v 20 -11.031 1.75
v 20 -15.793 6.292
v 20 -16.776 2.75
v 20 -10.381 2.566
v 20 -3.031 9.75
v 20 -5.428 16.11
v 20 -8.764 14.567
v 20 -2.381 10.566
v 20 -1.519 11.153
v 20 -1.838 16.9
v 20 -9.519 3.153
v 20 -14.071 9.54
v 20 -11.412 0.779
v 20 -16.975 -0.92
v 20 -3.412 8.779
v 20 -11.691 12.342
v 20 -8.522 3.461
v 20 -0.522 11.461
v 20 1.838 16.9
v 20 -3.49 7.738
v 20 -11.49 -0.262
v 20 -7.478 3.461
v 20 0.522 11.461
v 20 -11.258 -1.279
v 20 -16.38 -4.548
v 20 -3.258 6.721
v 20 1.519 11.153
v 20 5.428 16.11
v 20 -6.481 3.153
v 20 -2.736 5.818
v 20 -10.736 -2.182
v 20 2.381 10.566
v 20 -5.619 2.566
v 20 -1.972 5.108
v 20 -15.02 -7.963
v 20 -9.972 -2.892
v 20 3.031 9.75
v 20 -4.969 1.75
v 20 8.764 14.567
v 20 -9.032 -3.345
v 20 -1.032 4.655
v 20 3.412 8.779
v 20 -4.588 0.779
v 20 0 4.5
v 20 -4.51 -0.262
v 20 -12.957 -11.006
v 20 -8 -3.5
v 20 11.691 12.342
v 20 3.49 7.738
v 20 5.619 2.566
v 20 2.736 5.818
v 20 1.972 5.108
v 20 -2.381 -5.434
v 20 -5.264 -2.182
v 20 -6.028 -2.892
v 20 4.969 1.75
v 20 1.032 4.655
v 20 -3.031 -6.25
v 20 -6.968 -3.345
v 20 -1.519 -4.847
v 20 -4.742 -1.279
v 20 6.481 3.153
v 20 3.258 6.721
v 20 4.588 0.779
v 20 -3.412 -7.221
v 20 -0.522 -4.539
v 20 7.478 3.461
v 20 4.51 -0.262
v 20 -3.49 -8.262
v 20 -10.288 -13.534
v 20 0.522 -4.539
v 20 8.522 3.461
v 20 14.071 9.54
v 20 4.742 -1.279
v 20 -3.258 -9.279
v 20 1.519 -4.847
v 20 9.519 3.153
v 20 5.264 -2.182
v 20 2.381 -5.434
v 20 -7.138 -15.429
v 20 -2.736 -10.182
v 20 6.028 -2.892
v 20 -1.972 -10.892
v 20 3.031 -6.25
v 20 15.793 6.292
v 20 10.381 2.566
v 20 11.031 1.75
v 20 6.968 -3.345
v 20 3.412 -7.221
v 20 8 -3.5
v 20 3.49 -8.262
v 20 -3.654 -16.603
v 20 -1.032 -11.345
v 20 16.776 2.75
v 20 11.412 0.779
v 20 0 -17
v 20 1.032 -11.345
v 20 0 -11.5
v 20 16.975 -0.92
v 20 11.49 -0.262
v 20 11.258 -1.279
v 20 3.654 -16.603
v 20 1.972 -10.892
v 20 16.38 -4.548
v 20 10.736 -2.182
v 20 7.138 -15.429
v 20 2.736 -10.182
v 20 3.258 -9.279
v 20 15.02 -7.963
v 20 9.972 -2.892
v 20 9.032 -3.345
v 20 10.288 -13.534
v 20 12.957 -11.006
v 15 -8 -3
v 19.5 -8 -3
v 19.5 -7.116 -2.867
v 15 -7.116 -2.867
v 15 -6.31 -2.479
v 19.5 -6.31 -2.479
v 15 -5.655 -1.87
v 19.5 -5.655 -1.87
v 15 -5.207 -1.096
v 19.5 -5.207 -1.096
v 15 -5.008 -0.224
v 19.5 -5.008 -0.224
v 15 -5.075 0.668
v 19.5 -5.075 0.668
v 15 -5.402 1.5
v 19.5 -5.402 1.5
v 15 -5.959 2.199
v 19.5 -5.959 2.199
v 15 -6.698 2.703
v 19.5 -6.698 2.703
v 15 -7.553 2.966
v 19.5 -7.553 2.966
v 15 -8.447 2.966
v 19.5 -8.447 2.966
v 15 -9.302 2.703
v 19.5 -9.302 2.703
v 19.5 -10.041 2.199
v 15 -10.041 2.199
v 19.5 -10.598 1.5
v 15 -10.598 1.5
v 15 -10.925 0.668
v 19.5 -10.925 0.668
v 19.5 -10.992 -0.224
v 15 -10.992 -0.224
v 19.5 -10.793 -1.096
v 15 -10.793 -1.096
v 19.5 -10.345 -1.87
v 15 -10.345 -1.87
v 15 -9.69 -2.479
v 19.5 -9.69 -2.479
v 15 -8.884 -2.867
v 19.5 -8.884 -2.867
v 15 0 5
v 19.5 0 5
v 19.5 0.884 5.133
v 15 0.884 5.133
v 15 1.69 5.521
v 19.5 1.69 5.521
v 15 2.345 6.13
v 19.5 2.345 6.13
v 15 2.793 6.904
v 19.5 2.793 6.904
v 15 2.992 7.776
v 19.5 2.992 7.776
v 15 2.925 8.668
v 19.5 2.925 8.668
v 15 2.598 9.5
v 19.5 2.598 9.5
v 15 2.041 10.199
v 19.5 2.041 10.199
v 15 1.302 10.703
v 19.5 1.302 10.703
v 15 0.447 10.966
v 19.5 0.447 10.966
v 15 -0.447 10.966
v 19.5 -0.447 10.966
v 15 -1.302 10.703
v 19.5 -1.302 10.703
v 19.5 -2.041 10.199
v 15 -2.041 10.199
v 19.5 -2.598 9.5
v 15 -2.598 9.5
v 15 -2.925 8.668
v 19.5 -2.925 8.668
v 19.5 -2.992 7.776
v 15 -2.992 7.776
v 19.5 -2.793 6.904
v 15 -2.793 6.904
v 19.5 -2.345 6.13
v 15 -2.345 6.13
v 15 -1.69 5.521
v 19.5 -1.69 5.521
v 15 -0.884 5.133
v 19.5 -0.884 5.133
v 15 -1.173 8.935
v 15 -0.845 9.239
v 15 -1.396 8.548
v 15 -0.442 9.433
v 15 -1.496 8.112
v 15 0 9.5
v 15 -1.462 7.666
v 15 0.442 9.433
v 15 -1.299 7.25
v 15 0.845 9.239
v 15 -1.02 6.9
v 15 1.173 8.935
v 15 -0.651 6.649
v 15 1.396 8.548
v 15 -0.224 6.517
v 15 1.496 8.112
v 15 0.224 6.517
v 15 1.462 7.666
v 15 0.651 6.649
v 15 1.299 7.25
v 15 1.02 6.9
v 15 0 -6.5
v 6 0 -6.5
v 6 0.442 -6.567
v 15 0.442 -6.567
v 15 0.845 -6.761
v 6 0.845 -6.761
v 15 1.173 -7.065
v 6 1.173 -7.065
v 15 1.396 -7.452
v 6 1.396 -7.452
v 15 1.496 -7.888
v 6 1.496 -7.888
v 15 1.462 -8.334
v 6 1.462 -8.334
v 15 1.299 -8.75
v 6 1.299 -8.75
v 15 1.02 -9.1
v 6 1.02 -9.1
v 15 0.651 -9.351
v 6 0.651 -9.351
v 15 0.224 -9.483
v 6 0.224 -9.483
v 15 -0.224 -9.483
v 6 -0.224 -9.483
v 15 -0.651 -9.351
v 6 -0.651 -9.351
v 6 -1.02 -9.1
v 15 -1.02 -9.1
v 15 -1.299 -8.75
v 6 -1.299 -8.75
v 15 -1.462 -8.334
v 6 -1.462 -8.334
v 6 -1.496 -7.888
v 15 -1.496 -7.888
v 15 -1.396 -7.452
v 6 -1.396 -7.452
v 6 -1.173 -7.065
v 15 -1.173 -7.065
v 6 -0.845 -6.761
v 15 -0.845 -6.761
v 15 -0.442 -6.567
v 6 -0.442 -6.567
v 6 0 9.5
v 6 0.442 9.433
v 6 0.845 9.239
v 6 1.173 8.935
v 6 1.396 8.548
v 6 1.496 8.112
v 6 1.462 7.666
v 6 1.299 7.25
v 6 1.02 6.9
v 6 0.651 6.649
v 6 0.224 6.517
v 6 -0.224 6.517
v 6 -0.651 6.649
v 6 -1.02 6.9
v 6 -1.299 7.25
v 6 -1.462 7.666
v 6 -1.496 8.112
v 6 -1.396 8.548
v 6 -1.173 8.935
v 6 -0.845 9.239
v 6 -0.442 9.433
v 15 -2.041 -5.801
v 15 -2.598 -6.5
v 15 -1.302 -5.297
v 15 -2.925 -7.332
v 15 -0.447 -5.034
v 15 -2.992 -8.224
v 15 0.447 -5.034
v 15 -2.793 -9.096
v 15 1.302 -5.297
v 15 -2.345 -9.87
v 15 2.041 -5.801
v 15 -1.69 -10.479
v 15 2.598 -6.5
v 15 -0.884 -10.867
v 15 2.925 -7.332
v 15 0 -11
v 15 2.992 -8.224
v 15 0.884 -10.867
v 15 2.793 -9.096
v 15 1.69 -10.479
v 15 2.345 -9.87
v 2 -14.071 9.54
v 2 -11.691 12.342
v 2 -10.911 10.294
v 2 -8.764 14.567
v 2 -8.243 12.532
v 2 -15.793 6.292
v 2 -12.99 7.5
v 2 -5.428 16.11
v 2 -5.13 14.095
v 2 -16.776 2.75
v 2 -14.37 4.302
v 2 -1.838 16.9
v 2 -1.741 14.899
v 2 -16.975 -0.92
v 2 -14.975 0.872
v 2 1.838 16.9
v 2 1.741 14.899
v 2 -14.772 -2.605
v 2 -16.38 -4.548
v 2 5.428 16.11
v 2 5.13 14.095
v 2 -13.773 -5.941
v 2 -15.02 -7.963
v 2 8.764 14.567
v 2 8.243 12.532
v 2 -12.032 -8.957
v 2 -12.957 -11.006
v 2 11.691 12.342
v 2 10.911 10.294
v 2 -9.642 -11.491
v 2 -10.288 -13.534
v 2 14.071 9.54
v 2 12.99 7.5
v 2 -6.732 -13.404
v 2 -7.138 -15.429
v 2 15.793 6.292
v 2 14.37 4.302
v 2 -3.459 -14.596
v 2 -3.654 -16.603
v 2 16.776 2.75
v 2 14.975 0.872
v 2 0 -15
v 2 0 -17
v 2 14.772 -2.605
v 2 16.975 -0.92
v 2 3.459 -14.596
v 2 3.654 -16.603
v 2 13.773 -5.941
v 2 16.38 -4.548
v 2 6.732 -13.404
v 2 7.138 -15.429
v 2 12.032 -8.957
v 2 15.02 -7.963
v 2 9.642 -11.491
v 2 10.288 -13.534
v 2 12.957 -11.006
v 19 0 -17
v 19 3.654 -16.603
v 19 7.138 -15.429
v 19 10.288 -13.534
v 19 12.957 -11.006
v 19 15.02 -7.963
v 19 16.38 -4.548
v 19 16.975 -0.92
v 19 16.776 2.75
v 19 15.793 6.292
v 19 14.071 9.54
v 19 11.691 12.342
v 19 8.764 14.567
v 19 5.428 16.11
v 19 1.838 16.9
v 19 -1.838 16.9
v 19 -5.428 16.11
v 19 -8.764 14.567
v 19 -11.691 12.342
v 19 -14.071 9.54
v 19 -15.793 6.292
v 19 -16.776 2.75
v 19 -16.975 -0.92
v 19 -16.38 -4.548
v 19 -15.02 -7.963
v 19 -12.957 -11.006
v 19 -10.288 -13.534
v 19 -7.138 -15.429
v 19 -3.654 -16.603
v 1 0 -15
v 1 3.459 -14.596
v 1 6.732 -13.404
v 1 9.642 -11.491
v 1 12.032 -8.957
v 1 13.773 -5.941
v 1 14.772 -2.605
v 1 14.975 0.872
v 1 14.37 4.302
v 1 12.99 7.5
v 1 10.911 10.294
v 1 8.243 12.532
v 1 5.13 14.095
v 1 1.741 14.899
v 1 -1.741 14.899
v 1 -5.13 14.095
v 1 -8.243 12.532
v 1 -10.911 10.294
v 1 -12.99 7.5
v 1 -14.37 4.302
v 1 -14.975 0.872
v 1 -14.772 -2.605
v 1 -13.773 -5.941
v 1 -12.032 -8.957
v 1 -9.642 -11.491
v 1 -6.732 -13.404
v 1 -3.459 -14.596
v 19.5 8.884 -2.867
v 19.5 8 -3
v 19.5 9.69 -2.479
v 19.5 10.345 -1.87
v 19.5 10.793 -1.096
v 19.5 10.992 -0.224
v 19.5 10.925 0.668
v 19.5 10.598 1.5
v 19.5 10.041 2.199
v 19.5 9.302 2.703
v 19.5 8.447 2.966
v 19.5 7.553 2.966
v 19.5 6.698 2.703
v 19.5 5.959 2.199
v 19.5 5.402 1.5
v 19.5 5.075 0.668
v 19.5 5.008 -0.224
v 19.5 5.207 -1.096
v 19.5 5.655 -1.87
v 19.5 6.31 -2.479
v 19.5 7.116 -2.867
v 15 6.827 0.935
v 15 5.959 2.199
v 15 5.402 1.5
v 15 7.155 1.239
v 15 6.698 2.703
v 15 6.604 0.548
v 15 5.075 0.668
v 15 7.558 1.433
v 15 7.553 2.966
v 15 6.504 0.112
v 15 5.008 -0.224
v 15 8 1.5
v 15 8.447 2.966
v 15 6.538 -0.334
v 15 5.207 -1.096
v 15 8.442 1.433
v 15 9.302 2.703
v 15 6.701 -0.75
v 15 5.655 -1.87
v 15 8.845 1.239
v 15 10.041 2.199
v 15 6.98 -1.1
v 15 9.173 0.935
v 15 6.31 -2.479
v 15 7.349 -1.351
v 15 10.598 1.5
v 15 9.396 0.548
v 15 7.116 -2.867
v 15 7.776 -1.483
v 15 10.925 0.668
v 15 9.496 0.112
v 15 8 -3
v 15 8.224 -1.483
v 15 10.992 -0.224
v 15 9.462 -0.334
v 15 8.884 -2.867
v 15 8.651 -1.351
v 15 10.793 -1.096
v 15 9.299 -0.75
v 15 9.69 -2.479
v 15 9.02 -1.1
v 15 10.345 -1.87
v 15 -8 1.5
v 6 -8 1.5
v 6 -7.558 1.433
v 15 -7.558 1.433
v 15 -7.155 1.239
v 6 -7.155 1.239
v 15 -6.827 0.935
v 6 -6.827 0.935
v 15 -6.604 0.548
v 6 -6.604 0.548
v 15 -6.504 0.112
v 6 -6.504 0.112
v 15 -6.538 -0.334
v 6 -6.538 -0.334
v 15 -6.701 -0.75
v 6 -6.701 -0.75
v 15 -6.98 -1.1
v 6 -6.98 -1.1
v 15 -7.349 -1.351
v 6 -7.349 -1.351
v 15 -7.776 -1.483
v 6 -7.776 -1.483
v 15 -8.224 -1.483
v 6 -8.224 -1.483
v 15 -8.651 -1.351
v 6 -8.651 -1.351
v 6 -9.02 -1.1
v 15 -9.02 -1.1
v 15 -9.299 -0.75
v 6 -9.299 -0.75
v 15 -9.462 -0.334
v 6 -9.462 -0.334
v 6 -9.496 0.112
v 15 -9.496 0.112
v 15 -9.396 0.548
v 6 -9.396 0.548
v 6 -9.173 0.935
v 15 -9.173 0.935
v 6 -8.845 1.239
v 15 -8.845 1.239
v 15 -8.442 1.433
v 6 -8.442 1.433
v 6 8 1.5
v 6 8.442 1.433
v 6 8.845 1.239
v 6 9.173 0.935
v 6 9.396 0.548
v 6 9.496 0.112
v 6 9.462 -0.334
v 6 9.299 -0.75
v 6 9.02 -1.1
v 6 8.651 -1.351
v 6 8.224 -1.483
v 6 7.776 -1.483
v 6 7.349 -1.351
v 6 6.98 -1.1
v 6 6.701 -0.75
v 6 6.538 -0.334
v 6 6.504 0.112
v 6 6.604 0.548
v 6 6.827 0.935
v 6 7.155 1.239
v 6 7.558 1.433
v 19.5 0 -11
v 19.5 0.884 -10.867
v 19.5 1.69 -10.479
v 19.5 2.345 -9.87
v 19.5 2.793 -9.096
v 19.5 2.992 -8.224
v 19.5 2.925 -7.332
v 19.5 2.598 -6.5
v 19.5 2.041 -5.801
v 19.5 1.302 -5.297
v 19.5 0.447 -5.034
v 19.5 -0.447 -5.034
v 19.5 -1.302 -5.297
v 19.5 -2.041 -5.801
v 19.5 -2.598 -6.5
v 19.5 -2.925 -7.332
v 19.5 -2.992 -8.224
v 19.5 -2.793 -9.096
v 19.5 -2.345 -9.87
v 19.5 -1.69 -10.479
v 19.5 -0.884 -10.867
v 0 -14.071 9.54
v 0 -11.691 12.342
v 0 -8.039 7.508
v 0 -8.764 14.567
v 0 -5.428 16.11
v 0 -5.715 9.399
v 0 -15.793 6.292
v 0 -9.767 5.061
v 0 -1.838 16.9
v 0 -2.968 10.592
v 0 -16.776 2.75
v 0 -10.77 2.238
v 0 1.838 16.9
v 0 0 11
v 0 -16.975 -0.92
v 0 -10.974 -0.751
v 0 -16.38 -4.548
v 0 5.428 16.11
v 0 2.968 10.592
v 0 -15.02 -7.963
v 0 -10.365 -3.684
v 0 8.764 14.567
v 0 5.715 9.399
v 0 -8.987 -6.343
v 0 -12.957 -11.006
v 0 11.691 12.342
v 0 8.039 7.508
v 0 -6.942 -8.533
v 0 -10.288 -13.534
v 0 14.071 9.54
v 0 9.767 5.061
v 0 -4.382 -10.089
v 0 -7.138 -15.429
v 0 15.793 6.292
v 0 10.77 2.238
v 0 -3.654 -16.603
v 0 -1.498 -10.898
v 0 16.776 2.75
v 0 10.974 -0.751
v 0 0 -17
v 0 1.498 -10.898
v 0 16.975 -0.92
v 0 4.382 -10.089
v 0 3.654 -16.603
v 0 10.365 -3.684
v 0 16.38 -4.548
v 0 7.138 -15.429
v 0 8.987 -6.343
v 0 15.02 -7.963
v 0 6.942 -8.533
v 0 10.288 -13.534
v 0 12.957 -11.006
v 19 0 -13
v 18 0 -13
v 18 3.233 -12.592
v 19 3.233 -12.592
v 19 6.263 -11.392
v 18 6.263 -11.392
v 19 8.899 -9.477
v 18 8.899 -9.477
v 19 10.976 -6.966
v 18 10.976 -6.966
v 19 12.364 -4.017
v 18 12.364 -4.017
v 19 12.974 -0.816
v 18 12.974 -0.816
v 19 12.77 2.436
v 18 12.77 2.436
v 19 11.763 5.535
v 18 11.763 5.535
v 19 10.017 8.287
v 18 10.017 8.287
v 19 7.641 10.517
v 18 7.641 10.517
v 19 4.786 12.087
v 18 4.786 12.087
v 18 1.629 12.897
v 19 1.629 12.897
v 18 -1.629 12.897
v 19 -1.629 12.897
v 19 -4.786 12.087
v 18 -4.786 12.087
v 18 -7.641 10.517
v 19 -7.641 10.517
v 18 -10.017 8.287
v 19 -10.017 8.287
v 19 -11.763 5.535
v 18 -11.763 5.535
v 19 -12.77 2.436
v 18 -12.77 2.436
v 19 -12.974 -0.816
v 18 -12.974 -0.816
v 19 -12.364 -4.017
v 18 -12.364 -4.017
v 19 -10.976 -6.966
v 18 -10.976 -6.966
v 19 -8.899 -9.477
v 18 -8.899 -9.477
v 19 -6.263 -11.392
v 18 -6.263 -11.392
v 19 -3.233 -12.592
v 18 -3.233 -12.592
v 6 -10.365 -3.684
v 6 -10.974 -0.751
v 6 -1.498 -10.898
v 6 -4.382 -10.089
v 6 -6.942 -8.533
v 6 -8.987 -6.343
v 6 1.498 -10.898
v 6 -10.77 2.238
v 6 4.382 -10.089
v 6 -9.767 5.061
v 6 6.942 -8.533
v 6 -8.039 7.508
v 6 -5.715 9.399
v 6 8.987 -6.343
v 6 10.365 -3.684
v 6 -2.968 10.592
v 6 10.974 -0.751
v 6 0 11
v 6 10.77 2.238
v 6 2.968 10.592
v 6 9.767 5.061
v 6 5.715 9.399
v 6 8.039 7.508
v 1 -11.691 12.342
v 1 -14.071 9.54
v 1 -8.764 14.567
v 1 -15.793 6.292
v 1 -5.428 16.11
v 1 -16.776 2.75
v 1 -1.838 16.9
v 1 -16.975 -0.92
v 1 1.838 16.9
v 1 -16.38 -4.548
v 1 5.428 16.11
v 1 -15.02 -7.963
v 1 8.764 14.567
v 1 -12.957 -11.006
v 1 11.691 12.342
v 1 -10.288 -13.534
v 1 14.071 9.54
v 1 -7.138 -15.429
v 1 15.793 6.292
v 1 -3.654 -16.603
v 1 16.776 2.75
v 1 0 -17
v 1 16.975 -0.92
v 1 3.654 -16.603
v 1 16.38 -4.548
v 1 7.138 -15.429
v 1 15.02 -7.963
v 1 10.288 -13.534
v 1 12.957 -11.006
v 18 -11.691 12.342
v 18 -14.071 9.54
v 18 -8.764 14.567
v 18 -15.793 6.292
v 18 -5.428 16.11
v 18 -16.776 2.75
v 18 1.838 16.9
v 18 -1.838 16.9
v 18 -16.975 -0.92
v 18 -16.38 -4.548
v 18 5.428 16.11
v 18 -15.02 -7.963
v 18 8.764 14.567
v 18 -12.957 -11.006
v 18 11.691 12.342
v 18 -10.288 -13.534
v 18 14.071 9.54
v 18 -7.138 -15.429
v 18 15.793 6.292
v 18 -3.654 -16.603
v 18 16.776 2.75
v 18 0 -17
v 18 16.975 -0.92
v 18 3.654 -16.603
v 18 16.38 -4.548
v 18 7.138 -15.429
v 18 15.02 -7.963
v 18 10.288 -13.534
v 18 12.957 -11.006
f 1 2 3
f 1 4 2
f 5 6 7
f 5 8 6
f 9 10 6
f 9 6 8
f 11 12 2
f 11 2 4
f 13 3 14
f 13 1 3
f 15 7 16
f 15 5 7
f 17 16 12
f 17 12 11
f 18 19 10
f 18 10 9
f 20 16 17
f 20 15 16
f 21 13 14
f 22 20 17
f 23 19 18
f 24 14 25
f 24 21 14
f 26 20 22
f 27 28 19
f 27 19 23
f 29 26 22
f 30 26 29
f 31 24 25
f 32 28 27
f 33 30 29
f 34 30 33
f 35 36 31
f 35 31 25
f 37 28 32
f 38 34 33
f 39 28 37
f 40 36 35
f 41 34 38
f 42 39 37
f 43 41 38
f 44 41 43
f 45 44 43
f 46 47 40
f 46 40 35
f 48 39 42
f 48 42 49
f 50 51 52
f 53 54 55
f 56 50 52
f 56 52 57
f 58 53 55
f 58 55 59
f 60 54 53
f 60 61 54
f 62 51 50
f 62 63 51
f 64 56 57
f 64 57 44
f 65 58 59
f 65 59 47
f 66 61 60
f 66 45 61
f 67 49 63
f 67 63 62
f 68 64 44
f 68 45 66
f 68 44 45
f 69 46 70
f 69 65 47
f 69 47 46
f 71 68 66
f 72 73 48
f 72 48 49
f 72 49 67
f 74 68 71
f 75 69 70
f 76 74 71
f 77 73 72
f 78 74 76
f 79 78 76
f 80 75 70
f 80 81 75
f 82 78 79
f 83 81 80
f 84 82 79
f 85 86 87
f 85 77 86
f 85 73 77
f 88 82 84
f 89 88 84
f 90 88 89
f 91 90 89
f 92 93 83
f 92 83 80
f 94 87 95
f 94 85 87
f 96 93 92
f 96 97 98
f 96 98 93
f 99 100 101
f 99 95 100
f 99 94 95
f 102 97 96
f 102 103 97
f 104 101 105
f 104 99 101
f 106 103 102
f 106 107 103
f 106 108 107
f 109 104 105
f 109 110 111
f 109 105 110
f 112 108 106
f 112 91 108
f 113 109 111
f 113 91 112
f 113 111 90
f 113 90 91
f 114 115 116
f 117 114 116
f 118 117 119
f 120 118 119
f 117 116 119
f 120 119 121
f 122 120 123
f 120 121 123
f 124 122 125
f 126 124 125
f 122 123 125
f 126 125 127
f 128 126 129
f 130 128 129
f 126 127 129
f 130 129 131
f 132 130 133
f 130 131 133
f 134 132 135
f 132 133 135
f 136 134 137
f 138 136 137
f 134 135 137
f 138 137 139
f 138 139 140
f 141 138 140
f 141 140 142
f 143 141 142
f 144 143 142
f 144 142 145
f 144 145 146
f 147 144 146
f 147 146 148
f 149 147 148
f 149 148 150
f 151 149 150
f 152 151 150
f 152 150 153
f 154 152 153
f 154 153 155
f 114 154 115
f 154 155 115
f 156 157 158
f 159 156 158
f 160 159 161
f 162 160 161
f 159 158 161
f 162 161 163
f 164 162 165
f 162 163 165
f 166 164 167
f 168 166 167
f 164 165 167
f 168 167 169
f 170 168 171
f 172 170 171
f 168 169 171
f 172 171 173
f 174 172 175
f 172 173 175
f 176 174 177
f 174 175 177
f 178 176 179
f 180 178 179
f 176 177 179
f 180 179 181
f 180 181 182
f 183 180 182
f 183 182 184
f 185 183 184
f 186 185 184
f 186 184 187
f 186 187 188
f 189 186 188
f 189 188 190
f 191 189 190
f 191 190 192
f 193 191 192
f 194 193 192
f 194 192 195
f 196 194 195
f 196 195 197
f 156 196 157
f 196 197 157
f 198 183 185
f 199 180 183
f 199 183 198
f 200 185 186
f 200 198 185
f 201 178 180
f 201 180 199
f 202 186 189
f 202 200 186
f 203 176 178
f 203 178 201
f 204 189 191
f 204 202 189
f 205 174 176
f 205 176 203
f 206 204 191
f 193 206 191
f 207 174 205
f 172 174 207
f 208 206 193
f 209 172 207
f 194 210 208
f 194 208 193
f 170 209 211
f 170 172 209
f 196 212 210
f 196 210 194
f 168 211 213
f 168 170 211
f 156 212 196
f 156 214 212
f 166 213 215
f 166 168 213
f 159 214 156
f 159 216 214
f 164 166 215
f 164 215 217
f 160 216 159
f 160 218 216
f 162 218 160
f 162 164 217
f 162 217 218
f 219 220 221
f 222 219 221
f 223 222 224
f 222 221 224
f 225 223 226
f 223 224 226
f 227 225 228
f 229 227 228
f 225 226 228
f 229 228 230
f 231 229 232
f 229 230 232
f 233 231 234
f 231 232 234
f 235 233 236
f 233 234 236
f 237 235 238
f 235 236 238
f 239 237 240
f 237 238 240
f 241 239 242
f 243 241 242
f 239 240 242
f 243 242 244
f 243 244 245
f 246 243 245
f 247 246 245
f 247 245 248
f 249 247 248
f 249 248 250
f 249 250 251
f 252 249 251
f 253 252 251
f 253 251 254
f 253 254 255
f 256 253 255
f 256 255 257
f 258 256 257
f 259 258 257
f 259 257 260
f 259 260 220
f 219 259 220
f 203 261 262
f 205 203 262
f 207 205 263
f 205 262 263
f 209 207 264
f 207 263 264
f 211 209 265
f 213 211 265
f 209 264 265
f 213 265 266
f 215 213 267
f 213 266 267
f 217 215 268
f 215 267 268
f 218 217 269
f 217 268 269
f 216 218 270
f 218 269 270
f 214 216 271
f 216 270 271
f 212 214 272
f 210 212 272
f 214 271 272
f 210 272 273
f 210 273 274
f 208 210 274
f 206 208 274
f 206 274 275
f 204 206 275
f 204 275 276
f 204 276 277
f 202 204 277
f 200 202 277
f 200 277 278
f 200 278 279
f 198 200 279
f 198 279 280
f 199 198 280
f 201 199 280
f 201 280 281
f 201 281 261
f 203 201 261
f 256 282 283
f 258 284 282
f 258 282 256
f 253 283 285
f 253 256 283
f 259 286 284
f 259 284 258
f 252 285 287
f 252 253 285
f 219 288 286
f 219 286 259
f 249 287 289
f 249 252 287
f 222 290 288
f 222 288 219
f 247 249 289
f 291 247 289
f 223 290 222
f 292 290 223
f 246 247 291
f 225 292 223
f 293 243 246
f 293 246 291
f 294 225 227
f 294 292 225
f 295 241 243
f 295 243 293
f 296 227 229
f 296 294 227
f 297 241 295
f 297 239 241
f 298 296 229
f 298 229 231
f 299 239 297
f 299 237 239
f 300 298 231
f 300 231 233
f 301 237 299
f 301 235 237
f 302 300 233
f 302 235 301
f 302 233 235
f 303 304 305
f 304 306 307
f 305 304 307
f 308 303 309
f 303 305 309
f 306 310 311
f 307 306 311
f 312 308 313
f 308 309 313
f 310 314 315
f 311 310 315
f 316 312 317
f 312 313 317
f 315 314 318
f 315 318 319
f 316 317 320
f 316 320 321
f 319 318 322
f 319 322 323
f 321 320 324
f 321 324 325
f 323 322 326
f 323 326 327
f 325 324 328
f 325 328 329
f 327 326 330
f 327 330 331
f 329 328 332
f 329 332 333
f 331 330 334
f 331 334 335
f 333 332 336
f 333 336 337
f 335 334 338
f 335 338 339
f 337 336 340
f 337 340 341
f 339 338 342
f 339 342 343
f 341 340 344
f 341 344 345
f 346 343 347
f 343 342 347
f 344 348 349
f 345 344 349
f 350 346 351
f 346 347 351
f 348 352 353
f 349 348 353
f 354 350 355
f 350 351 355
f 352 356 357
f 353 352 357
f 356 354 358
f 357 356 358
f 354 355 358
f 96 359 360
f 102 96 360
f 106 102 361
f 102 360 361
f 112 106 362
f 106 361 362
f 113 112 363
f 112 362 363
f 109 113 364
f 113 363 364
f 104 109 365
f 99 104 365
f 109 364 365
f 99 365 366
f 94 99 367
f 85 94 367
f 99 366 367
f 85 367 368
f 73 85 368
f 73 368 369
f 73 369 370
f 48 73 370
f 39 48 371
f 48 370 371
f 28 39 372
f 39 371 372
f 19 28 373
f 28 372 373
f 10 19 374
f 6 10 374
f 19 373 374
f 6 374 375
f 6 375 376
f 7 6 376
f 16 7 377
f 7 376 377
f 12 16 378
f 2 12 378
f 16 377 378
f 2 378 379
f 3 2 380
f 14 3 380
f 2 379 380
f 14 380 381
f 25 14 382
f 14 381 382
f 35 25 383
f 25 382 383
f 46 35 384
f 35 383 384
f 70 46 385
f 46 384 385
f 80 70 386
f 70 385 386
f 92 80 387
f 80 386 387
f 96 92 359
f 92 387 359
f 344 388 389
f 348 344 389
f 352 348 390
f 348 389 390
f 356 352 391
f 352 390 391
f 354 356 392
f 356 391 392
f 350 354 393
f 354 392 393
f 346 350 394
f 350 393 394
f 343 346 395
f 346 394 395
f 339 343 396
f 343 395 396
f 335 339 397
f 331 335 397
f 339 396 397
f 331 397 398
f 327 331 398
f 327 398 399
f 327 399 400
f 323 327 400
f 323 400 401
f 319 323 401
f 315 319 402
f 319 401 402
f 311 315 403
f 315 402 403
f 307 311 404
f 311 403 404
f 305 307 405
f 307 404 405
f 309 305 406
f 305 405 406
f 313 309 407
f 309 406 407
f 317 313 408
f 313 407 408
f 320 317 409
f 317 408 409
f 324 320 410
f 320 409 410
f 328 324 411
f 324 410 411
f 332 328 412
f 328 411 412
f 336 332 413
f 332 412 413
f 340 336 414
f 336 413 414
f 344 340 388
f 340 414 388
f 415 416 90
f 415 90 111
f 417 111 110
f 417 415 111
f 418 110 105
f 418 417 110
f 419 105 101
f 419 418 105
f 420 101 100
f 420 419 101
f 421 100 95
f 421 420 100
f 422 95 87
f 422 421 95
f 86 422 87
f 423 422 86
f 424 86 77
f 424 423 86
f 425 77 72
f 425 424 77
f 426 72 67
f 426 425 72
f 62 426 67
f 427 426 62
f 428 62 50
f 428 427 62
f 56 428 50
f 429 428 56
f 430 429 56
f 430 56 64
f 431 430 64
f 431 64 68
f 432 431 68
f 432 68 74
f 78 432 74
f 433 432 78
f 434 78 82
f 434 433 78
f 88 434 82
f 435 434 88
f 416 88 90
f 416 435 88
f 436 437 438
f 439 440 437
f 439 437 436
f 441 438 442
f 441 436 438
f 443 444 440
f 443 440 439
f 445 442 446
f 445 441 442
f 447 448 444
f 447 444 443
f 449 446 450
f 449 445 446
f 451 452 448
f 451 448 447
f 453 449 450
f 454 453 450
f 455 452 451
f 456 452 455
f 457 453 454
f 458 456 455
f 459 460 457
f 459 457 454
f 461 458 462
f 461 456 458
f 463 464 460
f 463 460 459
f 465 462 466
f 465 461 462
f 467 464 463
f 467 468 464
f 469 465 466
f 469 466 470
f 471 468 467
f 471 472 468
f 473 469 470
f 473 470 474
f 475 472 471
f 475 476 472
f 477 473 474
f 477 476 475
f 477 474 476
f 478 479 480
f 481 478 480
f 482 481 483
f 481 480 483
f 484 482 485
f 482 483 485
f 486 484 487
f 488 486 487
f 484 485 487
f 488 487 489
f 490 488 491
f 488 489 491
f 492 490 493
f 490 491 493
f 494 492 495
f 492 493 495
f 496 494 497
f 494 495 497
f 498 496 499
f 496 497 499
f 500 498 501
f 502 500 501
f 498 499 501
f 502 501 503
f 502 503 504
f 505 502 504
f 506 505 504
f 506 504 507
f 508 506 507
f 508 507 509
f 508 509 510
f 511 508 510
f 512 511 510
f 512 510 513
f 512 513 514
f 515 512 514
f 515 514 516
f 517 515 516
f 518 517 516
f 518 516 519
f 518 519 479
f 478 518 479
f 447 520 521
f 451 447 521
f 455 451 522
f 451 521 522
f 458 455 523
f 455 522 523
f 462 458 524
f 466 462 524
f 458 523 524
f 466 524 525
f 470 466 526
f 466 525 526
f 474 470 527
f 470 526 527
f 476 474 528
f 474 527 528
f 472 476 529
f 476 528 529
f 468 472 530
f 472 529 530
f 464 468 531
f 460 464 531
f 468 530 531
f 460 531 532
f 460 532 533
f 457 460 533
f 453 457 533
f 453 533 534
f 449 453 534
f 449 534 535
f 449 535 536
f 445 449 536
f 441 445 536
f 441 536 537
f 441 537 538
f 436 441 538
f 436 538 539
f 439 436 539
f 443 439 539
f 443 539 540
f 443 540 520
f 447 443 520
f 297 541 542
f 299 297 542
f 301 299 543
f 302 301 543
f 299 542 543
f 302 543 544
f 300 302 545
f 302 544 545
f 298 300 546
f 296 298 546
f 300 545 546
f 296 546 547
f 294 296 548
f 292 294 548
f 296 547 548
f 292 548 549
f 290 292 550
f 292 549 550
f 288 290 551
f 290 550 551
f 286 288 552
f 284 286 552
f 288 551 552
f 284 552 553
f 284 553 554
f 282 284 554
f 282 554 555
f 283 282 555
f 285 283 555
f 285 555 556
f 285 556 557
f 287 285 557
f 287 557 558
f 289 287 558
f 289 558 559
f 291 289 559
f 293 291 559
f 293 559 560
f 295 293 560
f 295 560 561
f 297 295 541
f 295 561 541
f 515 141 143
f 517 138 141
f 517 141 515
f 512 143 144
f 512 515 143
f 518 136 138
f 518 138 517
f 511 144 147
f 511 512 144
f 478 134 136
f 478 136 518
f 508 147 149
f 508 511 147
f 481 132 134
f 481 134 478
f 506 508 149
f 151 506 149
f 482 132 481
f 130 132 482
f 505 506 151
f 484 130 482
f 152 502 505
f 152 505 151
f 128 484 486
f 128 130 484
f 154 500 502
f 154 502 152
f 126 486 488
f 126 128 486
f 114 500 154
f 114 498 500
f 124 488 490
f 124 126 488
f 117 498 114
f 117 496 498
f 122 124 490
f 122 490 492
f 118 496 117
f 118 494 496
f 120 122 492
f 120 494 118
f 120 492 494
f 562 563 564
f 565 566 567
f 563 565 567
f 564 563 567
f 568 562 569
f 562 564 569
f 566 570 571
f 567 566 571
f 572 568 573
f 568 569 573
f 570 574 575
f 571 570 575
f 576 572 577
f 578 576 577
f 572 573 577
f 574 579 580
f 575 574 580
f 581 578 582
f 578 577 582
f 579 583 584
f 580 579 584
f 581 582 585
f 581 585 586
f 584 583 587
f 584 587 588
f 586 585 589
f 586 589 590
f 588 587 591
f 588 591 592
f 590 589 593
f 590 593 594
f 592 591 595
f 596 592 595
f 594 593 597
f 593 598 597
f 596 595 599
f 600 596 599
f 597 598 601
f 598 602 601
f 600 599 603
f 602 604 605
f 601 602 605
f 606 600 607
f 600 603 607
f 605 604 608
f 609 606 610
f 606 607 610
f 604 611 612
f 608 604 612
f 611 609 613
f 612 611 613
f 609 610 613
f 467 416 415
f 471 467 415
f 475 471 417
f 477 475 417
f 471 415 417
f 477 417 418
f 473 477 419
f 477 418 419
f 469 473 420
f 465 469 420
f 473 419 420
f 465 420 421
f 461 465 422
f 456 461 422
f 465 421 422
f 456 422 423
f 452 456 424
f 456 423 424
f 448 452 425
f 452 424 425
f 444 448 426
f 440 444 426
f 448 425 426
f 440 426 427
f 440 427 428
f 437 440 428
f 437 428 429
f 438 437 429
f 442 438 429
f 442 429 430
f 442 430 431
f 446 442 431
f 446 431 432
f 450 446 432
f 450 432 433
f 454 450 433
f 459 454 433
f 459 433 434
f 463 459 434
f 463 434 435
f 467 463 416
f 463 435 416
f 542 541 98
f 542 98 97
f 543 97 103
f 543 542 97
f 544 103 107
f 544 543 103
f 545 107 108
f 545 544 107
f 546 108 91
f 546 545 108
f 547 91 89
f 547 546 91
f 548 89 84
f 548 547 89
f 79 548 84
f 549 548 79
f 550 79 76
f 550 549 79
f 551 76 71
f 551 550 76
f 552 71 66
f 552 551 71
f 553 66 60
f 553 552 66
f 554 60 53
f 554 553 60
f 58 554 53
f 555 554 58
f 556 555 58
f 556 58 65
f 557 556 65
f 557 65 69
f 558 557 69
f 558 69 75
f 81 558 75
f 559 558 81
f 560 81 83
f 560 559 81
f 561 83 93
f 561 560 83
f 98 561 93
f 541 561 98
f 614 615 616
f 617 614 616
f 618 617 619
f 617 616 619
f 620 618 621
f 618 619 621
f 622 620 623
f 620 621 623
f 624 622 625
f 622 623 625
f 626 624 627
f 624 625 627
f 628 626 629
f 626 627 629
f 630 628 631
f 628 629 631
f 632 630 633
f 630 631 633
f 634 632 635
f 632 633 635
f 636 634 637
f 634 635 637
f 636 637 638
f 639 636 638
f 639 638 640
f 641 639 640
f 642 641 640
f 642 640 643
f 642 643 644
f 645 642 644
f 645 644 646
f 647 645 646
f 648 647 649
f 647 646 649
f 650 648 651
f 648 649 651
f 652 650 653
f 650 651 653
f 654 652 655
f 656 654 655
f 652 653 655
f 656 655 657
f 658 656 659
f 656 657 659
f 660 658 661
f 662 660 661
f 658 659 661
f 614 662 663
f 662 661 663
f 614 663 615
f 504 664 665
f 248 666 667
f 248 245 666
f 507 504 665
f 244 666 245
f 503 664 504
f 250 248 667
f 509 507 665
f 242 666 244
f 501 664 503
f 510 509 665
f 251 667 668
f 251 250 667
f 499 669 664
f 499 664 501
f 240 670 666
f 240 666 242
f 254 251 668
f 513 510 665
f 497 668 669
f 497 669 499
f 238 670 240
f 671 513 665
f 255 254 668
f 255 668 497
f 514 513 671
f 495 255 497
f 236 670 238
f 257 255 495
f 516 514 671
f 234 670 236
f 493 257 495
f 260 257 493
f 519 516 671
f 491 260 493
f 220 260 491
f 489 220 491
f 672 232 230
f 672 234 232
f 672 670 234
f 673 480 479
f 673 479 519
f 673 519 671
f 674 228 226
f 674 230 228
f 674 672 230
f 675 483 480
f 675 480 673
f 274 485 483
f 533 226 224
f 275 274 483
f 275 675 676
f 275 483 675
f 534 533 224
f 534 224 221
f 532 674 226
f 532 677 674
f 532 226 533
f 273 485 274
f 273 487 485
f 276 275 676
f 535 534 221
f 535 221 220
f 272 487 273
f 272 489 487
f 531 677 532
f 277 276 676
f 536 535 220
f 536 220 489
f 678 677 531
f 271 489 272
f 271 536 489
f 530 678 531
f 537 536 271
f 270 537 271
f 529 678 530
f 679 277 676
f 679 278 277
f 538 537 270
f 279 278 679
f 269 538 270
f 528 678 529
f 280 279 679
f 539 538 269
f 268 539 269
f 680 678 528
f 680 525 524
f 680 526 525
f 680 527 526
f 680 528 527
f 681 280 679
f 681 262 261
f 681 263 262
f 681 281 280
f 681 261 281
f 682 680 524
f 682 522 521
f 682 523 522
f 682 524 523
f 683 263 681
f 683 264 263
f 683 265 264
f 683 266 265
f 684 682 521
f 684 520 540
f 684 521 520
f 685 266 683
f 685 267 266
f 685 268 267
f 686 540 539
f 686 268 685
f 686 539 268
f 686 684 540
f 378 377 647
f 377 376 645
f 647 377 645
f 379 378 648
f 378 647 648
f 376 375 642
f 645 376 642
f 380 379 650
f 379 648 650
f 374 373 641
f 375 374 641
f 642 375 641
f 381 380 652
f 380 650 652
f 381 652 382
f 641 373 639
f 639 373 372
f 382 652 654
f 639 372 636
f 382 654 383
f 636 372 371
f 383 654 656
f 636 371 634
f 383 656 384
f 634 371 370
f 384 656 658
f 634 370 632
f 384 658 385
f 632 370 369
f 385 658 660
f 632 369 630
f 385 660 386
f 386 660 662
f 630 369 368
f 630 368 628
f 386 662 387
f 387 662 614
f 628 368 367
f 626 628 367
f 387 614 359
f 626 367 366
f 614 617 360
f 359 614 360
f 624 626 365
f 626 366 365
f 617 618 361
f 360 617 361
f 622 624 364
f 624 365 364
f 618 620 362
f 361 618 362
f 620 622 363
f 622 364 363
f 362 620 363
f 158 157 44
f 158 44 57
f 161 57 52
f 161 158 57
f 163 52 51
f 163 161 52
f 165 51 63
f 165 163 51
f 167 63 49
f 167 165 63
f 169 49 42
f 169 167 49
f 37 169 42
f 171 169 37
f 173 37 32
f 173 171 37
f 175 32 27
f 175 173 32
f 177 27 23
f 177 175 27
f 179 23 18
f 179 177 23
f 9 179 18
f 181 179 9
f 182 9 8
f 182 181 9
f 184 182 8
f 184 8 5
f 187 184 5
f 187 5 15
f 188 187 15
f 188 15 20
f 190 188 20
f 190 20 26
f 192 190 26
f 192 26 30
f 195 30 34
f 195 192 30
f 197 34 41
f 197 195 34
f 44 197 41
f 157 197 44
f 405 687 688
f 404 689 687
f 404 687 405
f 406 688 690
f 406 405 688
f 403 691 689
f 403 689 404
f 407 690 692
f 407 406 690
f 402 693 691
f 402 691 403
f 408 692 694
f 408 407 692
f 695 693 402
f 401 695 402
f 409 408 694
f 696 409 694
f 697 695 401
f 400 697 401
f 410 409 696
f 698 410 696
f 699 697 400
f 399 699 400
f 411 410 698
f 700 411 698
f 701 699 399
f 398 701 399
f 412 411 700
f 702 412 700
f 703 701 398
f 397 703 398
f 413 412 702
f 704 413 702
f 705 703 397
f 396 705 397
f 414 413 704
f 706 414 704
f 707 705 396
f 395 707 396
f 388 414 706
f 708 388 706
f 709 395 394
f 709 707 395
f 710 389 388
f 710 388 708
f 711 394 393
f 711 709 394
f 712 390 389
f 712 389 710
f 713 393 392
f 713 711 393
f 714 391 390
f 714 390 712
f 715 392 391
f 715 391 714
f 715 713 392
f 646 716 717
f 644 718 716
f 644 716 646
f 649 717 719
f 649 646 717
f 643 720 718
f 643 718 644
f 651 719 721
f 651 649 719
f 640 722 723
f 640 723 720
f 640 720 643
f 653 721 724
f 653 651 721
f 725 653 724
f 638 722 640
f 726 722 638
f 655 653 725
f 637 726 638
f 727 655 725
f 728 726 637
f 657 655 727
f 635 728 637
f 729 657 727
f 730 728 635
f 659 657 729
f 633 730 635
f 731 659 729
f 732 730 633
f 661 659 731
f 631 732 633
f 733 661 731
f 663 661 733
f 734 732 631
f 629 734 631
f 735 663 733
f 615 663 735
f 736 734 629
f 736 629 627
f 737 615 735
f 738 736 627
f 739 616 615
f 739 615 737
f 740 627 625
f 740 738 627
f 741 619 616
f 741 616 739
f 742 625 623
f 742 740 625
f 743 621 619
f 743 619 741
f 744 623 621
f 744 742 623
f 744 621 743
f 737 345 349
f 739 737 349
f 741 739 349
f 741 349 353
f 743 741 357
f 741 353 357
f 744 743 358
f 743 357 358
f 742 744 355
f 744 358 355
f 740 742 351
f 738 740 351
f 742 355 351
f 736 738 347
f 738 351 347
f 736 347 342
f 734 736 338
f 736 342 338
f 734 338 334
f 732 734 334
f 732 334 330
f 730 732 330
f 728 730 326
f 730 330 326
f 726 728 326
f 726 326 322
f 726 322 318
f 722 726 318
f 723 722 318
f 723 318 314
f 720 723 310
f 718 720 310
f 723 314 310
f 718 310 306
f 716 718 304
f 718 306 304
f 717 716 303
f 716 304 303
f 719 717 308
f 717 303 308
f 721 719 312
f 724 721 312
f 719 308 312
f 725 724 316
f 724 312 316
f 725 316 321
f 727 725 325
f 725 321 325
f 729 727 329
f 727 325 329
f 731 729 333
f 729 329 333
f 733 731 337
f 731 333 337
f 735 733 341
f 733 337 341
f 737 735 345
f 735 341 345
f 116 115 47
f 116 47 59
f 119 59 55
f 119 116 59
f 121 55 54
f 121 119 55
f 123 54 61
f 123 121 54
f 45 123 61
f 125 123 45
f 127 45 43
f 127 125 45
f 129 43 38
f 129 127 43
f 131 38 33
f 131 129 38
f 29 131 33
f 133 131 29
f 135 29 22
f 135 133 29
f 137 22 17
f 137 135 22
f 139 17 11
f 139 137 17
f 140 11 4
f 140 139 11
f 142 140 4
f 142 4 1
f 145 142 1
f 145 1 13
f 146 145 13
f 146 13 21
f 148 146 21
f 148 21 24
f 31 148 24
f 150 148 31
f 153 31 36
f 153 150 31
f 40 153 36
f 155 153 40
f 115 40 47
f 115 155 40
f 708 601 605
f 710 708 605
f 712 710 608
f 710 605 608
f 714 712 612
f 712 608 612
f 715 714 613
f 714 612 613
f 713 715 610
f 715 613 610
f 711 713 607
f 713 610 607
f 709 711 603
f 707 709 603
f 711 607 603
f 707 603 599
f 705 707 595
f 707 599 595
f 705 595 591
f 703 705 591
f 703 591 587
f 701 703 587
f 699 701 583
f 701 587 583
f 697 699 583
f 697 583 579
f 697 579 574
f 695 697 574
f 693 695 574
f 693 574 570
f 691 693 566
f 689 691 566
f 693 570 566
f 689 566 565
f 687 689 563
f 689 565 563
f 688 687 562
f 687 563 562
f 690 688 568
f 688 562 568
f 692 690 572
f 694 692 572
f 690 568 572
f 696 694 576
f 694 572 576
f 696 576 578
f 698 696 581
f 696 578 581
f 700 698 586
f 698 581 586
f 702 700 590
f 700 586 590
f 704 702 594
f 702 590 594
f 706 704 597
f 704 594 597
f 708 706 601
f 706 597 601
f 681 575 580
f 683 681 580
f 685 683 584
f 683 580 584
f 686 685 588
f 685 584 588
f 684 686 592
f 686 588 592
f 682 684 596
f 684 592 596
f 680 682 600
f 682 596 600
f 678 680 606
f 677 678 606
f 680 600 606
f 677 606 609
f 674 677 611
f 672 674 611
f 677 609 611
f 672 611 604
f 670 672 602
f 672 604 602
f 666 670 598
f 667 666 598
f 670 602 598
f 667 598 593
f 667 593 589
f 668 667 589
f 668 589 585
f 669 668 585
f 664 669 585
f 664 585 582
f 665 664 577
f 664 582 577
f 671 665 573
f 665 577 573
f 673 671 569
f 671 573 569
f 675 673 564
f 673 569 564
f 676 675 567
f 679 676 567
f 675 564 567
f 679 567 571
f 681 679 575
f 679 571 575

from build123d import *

# Parameters (mm, degrees)
SKETCH1_R           = 17
BOSS_EXTRUDE1_DEPTH = 1
SKETCH2_R           = 15
BOSS_EXTRUDE2_DEPTH = 1
SKETCH4_R           = 17
BOSS_EXTRUDE3_DEPTH = 16
SKETCH5_R           = 13
BOSS_EXTRUDE4_DEPTH = 1
SKETCH6_R           = 17
BOSS_EXTRUDE5_DEPTH = 1
SKETCH7_R           = 11
CUT_EXTRUDE1_DEPTH  = 6
SKETCH8_R           = 1.5
CUT_EXTRUDE2_DEPTH  = 14
SKETCH9_R           = 3
CUT_EXTRUDE3_DEPTH  = 5
CHAMFER1_SIZE       = 0.5


with BuildPart() as part:
    # Sketch1 → Boss-Extrude1 (new body)
    with BuildSketch(Plane(origin=(0, 0, 0), x_dir=(0, 0, -1), z_dir=(1, 0, 0))):
        Circle(SKETCH1_R)
    extrude(amount=BOSS_EXTRUDE1_DEPTH)

    # Sketch2 → Boss-Extrude2 (add)
    with BuildSketch(Plane(origin=(1, 0, 0), x_dir=(0, 0, -1), z_dir=(1, 0, 0))):
        Circle(SKETCH2_R)
    extrude(amount=BOSS_EXTRUDE2_DEPTH)

    # Sketch4 → Boss-Extrude3 (add)
    with BuildSketch(Plane(origin=(2, 0, 0), x_dir=(0, 0, -1), z_dir=(1, 0, 0))):
        Circle(SKETCH4_R)
    extrude(amount=BOSS_EXTRUDE3_DEPTH)

    # Sketch5 → Boss-Extrude4 (add)
    with BuildSketch(Plane(origin=(18, 0, 0), x_dir=(0, 0, -1), z_dir=(1, 0, 0))):
        Circle(SKETCH5_R)
    extrude(amount=BOSS_EXTRUDE4_DEPTH)

    # Sketch6 → Boss-Extrude5 (add)
    with BuildSketch(Plane(origin=(19, 0, 0), x_dir=(0, 0, -1), z_dir=(1, 0, 0))):
        Circle(SKETCH6_R)
    extrude(amount=BOSS_EXTRUDE5_DEPTH)

    # Sketch7 → Cut-Extrude1 (cut)
    with BuildSketch(Plane.ZY):
        Circle(SKETCH7_R)
    extrude(amount=-CUT_EXTRUDE1_DEPTH, mode=Mode.SUBTRACT)

    # Sketch8 → Cut-Extrude2 (cut)
    with BuildSketch(Plane.ZY.offset(-6)):
        with Locations((0, 8)):
            Circle(SKETCH8_R)
        with Locations((8, 0)):
            Circle(SKETCH8_R)
        with Locations((0, -8)):
            Circle(SKETCH8_R)
        with Locations((-8, 0)):
            Circle(SKETCH8_R)
    extrude(amount=-CUT_EXTRUDE2_DEPTH, mode=Mode.SUBTRACT)

    # Sketch9 → Cut-Extrude3 (cut)
    with BuildSketch(Plane(origin=(20, 0, 0), x_dir=(0, 0, -1), z_dir=(1, 0, 0))):
        with Locations((-8, 0)):
            Circle(SKETCH9_R)
        with Locations((0, 8)):
            Circle(SKETCH9_R)
        with Locations((8, 0)):
            Circle(SKETCH9_R)
        with Locations((0, -8)):
            Circle(SKETCH9_R)
    extrude(amount=-CUT_EXTRUDE3_DEPTH, mode=Mode.SUBTRACT)

    # Chamfer1
    chamfer1_edges = [part.edges().sort_by_distance(p)[0] for p in [
        (20, 0, 11),
        (20, 8, 3),
        (20, 0, -5),
        (20, -8, 3),
    ]]
    chamfer(chamfer1_edges, length=CHAMFER1_SIZE)


solid = part.part
